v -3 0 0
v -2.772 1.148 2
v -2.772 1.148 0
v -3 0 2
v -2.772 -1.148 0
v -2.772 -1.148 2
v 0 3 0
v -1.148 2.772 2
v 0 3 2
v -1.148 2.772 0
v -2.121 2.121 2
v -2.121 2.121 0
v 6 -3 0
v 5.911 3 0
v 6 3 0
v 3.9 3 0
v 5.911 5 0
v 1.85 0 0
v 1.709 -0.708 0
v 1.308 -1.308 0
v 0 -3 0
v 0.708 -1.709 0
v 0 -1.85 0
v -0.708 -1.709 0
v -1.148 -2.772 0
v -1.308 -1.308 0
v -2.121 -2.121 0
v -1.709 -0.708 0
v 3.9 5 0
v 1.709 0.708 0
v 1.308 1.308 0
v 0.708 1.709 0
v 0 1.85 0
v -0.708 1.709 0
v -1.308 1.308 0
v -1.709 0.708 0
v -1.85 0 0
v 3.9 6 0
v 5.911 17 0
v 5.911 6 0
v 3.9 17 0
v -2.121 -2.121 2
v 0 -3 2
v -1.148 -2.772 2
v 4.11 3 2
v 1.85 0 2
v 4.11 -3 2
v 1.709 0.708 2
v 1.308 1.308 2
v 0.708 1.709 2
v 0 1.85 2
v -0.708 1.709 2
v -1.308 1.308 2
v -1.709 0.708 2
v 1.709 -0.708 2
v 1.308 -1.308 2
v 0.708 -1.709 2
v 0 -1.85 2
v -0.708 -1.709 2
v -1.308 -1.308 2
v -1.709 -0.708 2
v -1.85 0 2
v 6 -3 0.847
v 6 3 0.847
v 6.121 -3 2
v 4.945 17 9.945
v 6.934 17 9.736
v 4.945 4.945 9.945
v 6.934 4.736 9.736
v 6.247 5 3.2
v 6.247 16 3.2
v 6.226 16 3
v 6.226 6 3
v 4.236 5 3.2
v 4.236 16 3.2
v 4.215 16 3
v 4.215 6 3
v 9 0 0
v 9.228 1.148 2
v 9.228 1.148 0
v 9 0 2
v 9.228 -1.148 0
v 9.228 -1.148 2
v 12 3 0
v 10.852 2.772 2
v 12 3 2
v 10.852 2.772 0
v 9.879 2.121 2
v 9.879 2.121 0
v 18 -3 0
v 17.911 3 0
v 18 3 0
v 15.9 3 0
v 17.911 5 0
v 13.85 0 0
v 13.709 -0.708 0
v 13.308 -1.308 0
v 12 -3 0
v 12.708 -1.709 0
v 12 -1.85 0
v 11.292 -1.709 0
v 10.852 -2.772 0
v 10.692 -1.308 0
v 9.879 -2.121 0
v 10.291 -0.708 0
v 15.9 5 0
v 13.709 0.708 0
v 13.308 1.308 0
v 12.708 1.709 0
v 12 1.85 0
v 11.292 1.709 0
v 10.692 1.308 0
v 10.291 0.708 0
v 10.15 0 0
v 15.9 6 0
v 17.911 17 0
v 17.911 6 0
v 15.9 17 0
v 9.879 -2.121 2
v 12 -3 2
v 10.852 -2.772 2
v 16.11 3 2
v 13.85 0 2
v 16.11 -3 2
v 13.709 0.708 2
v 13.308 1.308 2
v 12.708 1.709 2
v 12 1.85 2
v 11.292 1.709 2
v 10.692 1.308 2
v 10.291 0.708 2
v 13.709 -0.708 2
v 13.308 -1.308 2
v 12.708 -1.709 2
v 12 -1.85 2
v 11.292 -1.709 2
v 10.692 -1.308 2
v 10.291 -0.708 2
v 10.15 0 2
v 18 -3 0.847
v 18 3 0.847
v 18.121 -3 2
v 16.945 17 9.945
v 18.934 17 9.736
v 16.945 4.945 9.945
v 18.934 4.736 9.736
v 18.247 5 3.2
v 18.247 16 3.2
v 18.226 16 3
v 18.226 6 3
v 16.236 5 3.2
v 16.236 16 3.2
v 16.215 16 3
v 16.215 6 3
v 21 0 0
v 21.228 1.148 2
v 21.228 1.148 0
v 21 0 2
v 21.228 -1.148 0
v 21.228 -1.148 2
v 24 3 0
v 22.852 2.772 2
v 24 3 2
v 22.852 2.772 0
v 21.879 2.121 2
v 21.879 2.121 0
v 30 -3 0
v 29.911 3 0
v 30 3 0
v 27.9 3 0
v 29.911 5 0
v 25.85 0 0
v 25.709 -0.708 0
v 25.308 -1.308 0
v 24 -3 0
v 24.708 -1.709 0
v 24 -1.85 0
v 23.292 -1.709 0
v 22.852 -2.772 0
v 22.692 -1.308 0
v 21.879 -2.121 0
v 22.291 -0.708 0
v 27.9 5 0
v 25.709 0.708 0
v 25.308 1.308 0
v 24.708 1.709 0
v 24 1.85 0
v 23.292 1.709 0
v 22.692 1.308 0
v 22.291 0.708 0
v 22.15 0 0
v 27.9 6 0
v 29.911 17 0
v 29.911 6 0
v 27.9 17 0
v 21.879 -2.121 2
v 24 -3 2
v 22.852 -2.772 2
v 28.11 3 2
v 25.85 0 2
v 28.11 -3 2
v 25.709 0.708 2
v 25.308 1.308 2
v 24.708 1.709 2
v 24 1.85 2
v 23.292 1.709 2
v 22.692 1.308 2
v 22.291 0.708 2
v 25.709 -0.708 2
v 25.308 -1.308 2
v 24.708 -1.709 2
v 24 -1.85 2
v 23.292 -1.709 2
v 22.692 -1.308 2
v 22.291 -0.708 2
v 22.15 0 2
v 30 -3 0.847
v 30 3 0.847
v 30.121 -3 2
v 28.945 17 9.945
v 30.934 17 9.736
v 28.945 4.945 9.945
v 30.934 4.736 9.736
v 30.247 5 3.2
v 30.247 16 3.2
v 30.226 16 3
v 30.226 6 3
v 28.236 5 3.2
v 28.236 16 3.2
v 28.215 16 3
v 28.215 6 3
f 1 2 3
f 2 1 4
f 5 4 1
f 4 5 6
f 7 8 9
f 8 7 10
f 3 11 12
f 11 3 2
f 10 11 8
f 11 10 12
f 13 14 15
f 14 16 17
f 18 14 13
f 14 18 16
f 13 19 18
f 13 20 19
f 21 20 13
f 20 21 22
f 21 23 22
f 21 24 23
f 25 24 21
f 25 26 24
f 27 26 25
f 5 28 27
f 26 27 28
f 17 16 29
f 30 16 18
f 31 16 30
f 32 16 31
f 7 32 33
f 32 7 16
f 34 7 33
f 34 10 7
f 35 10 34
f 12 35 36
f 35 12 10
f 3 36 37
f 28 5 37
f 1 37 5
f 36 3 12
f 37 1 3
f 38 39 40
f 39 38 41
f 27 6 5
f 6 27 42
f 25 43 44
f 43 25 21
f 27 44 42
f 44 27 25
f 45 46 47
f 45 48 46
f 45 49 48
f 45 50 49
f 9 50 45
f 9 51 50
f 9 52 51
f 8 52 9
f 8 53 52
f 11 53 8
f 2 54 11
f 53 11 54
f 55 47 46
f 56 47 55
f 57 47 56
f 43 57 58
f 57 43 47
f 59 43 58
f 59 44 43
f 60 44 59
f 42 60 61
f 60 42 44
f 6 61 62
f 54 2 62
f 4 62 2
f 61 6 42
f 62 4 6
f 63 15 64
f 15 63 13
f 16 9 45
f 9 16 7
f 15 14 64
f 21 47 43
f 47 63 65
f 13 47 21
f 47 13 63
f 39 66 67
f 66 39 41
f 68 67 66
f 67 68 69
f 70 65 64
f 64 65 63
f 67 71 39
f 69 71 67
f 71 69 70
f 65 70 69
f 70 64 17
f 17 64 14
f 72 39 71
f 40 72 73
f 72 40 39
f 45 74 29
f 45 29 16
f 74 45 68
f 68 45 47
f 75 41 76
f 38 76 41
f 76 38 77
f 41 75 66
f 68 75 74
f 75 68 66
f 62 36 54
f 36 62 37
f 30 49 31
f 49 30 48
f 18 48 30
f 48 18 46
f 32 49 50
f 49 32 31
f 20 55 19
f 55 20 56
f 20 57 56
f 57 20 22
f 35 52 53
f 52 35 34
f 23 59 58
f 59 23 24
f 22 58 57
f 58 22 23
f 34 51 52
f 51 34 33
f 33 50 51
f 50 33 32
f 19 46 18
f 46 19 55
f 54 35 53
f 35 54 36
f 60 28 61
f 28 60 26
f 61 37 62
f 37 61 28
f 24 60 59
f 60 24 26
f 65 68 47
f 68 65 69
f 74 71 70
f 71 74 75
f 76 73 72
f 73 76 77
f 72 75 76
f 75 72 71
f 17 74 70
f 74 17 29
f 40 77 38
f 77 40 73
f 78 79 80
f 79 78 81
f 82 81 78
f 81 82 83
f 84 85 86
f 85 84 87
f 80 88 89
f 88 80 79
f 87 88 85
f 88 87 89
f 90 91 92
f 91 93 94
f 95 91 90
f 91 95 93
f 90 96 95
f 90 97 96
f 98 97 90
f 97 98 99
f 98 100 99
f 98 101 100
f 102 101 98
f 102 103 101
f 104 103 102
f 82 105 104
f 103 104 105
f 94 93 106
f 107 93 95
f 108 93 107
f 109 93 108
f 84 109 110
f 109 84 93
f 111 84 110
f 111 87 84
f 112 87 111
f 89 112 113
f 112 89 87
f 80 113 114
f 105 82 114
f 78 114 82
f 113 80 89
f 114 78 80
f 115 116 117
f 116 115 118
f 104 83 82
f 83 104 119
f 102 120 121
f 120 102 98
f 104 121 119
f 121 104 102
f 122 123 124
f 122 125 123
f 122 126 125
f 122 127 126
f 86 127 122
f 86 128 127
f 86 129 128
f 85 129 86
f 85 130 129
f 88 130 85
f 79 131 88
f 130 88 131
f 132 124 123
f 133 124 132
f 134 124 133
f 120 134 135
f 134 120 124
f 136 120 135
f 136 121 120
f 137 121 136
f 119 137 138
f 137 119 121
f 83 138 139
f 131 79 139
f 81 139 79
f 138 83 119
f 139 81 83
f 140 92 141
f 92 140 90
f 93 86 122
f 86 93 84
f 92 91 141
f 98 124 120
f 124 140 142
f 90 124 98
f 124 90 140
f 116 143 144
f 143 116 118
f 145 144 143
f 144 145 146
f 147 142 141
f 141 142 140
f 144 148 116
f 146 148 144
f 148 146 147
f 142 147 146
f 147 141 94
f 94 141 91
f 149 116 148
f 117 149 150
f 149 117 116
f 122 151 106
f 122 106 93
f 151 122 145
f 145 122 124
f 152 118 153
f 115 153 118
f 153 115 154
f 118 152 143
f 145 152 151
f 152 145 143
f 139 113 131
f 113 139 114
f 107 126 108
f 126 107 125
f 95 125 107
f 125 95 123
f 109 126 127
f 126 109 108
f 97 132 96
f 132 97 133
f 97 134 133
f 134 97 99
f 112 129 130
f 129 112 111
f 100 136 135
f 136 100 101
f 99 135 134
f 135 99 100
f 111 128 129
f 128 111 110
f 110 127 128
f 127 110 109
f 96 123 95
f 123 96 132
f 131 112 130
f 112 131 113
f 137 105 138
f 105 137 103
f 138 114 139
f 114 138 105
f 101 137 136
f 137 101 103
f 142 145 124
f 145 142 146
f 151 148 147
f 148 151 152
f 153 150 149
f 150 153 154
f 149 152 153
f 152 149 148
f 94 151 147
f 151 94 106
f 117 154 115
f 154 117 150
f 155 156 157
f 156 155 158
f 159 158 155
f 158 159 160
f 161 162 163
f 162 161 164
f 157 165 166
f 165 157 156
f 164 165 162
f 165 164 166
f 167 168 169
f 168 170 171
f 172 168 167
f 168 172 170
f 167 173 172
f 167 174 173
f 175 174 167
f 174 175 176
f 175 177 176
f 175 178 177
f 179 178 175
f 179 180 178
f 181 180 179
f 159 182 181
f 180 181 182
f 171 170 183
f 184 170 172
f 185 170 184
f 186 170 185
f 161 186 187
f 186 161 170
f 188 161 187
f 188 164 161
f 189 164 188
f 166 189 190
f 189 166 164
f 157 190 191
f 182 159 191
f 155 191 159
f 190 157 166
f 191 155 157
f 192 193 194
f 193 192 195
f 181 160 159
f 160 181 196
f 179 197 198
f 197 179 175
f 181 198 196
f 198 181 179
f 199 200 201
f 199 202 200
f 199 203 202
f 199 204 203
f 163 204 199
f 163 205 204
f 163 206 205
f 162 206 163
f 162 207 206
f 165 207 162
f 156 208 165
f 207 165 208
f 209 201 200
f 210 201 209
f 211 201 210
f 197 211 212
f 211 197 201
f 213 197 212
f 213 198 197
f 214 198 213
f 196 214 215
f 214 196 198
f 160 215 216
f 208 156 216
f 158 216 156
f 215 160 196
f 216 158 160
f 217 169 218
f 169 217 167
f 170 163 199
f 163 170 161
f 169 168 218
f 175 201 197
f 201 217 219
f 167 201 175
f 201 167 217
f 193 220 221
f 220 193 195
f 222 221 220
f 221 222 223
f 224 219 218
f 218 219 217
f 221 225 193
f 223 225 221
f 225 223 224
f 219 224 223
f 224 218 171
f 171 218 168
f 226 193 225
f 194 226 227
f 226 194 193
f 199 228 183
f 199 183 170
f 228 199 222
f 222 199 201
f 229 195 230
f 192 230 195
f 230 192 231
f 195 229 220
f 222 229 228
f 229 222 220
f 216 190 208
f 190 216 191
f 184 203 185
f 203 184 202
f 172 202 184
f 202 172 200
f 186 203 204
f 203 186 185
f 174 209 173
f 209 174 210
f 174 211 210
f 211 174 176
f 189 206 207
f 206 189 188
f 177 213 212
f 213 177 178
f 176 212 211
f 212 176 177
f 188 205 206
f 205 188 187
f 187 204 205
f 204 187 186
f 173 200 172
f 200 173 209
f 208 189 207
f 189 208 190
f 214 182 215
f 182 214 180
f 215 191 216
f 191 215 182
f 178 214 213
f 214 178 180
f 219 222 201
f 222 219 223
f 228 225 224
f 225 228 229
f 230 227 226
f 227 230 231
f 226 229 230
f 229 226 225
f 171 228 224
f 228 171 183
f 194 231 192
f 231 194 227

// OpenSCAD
M3HoleDiameter = 3.7;

module Trigger() {
difference() {
union() {
	cylinder(h=2,d=6,$fn=16);
	translate([0,-3,0])cube([6,6,2]);
	translate([3.9,-3,0])rotate([0,6,0])cube([2,20,10]);
}
	cylinder(h=2.1,d=M3HoleDiameter,$fn=16);
	translate([-25,-25,-5])cube([50,50,5]);
	translate([0,-5,0])rotate([-45,0,0])translate([-10,-20,0])cube([20,20,20]);
	translate([-5,5,3])cube([20,11,0.2]);
	translate([-5,5,0])cube([20,1,3]);
}

}


for(i = [0,1,2]) {
	translate([12*i,0,0]) Trigger();
}
